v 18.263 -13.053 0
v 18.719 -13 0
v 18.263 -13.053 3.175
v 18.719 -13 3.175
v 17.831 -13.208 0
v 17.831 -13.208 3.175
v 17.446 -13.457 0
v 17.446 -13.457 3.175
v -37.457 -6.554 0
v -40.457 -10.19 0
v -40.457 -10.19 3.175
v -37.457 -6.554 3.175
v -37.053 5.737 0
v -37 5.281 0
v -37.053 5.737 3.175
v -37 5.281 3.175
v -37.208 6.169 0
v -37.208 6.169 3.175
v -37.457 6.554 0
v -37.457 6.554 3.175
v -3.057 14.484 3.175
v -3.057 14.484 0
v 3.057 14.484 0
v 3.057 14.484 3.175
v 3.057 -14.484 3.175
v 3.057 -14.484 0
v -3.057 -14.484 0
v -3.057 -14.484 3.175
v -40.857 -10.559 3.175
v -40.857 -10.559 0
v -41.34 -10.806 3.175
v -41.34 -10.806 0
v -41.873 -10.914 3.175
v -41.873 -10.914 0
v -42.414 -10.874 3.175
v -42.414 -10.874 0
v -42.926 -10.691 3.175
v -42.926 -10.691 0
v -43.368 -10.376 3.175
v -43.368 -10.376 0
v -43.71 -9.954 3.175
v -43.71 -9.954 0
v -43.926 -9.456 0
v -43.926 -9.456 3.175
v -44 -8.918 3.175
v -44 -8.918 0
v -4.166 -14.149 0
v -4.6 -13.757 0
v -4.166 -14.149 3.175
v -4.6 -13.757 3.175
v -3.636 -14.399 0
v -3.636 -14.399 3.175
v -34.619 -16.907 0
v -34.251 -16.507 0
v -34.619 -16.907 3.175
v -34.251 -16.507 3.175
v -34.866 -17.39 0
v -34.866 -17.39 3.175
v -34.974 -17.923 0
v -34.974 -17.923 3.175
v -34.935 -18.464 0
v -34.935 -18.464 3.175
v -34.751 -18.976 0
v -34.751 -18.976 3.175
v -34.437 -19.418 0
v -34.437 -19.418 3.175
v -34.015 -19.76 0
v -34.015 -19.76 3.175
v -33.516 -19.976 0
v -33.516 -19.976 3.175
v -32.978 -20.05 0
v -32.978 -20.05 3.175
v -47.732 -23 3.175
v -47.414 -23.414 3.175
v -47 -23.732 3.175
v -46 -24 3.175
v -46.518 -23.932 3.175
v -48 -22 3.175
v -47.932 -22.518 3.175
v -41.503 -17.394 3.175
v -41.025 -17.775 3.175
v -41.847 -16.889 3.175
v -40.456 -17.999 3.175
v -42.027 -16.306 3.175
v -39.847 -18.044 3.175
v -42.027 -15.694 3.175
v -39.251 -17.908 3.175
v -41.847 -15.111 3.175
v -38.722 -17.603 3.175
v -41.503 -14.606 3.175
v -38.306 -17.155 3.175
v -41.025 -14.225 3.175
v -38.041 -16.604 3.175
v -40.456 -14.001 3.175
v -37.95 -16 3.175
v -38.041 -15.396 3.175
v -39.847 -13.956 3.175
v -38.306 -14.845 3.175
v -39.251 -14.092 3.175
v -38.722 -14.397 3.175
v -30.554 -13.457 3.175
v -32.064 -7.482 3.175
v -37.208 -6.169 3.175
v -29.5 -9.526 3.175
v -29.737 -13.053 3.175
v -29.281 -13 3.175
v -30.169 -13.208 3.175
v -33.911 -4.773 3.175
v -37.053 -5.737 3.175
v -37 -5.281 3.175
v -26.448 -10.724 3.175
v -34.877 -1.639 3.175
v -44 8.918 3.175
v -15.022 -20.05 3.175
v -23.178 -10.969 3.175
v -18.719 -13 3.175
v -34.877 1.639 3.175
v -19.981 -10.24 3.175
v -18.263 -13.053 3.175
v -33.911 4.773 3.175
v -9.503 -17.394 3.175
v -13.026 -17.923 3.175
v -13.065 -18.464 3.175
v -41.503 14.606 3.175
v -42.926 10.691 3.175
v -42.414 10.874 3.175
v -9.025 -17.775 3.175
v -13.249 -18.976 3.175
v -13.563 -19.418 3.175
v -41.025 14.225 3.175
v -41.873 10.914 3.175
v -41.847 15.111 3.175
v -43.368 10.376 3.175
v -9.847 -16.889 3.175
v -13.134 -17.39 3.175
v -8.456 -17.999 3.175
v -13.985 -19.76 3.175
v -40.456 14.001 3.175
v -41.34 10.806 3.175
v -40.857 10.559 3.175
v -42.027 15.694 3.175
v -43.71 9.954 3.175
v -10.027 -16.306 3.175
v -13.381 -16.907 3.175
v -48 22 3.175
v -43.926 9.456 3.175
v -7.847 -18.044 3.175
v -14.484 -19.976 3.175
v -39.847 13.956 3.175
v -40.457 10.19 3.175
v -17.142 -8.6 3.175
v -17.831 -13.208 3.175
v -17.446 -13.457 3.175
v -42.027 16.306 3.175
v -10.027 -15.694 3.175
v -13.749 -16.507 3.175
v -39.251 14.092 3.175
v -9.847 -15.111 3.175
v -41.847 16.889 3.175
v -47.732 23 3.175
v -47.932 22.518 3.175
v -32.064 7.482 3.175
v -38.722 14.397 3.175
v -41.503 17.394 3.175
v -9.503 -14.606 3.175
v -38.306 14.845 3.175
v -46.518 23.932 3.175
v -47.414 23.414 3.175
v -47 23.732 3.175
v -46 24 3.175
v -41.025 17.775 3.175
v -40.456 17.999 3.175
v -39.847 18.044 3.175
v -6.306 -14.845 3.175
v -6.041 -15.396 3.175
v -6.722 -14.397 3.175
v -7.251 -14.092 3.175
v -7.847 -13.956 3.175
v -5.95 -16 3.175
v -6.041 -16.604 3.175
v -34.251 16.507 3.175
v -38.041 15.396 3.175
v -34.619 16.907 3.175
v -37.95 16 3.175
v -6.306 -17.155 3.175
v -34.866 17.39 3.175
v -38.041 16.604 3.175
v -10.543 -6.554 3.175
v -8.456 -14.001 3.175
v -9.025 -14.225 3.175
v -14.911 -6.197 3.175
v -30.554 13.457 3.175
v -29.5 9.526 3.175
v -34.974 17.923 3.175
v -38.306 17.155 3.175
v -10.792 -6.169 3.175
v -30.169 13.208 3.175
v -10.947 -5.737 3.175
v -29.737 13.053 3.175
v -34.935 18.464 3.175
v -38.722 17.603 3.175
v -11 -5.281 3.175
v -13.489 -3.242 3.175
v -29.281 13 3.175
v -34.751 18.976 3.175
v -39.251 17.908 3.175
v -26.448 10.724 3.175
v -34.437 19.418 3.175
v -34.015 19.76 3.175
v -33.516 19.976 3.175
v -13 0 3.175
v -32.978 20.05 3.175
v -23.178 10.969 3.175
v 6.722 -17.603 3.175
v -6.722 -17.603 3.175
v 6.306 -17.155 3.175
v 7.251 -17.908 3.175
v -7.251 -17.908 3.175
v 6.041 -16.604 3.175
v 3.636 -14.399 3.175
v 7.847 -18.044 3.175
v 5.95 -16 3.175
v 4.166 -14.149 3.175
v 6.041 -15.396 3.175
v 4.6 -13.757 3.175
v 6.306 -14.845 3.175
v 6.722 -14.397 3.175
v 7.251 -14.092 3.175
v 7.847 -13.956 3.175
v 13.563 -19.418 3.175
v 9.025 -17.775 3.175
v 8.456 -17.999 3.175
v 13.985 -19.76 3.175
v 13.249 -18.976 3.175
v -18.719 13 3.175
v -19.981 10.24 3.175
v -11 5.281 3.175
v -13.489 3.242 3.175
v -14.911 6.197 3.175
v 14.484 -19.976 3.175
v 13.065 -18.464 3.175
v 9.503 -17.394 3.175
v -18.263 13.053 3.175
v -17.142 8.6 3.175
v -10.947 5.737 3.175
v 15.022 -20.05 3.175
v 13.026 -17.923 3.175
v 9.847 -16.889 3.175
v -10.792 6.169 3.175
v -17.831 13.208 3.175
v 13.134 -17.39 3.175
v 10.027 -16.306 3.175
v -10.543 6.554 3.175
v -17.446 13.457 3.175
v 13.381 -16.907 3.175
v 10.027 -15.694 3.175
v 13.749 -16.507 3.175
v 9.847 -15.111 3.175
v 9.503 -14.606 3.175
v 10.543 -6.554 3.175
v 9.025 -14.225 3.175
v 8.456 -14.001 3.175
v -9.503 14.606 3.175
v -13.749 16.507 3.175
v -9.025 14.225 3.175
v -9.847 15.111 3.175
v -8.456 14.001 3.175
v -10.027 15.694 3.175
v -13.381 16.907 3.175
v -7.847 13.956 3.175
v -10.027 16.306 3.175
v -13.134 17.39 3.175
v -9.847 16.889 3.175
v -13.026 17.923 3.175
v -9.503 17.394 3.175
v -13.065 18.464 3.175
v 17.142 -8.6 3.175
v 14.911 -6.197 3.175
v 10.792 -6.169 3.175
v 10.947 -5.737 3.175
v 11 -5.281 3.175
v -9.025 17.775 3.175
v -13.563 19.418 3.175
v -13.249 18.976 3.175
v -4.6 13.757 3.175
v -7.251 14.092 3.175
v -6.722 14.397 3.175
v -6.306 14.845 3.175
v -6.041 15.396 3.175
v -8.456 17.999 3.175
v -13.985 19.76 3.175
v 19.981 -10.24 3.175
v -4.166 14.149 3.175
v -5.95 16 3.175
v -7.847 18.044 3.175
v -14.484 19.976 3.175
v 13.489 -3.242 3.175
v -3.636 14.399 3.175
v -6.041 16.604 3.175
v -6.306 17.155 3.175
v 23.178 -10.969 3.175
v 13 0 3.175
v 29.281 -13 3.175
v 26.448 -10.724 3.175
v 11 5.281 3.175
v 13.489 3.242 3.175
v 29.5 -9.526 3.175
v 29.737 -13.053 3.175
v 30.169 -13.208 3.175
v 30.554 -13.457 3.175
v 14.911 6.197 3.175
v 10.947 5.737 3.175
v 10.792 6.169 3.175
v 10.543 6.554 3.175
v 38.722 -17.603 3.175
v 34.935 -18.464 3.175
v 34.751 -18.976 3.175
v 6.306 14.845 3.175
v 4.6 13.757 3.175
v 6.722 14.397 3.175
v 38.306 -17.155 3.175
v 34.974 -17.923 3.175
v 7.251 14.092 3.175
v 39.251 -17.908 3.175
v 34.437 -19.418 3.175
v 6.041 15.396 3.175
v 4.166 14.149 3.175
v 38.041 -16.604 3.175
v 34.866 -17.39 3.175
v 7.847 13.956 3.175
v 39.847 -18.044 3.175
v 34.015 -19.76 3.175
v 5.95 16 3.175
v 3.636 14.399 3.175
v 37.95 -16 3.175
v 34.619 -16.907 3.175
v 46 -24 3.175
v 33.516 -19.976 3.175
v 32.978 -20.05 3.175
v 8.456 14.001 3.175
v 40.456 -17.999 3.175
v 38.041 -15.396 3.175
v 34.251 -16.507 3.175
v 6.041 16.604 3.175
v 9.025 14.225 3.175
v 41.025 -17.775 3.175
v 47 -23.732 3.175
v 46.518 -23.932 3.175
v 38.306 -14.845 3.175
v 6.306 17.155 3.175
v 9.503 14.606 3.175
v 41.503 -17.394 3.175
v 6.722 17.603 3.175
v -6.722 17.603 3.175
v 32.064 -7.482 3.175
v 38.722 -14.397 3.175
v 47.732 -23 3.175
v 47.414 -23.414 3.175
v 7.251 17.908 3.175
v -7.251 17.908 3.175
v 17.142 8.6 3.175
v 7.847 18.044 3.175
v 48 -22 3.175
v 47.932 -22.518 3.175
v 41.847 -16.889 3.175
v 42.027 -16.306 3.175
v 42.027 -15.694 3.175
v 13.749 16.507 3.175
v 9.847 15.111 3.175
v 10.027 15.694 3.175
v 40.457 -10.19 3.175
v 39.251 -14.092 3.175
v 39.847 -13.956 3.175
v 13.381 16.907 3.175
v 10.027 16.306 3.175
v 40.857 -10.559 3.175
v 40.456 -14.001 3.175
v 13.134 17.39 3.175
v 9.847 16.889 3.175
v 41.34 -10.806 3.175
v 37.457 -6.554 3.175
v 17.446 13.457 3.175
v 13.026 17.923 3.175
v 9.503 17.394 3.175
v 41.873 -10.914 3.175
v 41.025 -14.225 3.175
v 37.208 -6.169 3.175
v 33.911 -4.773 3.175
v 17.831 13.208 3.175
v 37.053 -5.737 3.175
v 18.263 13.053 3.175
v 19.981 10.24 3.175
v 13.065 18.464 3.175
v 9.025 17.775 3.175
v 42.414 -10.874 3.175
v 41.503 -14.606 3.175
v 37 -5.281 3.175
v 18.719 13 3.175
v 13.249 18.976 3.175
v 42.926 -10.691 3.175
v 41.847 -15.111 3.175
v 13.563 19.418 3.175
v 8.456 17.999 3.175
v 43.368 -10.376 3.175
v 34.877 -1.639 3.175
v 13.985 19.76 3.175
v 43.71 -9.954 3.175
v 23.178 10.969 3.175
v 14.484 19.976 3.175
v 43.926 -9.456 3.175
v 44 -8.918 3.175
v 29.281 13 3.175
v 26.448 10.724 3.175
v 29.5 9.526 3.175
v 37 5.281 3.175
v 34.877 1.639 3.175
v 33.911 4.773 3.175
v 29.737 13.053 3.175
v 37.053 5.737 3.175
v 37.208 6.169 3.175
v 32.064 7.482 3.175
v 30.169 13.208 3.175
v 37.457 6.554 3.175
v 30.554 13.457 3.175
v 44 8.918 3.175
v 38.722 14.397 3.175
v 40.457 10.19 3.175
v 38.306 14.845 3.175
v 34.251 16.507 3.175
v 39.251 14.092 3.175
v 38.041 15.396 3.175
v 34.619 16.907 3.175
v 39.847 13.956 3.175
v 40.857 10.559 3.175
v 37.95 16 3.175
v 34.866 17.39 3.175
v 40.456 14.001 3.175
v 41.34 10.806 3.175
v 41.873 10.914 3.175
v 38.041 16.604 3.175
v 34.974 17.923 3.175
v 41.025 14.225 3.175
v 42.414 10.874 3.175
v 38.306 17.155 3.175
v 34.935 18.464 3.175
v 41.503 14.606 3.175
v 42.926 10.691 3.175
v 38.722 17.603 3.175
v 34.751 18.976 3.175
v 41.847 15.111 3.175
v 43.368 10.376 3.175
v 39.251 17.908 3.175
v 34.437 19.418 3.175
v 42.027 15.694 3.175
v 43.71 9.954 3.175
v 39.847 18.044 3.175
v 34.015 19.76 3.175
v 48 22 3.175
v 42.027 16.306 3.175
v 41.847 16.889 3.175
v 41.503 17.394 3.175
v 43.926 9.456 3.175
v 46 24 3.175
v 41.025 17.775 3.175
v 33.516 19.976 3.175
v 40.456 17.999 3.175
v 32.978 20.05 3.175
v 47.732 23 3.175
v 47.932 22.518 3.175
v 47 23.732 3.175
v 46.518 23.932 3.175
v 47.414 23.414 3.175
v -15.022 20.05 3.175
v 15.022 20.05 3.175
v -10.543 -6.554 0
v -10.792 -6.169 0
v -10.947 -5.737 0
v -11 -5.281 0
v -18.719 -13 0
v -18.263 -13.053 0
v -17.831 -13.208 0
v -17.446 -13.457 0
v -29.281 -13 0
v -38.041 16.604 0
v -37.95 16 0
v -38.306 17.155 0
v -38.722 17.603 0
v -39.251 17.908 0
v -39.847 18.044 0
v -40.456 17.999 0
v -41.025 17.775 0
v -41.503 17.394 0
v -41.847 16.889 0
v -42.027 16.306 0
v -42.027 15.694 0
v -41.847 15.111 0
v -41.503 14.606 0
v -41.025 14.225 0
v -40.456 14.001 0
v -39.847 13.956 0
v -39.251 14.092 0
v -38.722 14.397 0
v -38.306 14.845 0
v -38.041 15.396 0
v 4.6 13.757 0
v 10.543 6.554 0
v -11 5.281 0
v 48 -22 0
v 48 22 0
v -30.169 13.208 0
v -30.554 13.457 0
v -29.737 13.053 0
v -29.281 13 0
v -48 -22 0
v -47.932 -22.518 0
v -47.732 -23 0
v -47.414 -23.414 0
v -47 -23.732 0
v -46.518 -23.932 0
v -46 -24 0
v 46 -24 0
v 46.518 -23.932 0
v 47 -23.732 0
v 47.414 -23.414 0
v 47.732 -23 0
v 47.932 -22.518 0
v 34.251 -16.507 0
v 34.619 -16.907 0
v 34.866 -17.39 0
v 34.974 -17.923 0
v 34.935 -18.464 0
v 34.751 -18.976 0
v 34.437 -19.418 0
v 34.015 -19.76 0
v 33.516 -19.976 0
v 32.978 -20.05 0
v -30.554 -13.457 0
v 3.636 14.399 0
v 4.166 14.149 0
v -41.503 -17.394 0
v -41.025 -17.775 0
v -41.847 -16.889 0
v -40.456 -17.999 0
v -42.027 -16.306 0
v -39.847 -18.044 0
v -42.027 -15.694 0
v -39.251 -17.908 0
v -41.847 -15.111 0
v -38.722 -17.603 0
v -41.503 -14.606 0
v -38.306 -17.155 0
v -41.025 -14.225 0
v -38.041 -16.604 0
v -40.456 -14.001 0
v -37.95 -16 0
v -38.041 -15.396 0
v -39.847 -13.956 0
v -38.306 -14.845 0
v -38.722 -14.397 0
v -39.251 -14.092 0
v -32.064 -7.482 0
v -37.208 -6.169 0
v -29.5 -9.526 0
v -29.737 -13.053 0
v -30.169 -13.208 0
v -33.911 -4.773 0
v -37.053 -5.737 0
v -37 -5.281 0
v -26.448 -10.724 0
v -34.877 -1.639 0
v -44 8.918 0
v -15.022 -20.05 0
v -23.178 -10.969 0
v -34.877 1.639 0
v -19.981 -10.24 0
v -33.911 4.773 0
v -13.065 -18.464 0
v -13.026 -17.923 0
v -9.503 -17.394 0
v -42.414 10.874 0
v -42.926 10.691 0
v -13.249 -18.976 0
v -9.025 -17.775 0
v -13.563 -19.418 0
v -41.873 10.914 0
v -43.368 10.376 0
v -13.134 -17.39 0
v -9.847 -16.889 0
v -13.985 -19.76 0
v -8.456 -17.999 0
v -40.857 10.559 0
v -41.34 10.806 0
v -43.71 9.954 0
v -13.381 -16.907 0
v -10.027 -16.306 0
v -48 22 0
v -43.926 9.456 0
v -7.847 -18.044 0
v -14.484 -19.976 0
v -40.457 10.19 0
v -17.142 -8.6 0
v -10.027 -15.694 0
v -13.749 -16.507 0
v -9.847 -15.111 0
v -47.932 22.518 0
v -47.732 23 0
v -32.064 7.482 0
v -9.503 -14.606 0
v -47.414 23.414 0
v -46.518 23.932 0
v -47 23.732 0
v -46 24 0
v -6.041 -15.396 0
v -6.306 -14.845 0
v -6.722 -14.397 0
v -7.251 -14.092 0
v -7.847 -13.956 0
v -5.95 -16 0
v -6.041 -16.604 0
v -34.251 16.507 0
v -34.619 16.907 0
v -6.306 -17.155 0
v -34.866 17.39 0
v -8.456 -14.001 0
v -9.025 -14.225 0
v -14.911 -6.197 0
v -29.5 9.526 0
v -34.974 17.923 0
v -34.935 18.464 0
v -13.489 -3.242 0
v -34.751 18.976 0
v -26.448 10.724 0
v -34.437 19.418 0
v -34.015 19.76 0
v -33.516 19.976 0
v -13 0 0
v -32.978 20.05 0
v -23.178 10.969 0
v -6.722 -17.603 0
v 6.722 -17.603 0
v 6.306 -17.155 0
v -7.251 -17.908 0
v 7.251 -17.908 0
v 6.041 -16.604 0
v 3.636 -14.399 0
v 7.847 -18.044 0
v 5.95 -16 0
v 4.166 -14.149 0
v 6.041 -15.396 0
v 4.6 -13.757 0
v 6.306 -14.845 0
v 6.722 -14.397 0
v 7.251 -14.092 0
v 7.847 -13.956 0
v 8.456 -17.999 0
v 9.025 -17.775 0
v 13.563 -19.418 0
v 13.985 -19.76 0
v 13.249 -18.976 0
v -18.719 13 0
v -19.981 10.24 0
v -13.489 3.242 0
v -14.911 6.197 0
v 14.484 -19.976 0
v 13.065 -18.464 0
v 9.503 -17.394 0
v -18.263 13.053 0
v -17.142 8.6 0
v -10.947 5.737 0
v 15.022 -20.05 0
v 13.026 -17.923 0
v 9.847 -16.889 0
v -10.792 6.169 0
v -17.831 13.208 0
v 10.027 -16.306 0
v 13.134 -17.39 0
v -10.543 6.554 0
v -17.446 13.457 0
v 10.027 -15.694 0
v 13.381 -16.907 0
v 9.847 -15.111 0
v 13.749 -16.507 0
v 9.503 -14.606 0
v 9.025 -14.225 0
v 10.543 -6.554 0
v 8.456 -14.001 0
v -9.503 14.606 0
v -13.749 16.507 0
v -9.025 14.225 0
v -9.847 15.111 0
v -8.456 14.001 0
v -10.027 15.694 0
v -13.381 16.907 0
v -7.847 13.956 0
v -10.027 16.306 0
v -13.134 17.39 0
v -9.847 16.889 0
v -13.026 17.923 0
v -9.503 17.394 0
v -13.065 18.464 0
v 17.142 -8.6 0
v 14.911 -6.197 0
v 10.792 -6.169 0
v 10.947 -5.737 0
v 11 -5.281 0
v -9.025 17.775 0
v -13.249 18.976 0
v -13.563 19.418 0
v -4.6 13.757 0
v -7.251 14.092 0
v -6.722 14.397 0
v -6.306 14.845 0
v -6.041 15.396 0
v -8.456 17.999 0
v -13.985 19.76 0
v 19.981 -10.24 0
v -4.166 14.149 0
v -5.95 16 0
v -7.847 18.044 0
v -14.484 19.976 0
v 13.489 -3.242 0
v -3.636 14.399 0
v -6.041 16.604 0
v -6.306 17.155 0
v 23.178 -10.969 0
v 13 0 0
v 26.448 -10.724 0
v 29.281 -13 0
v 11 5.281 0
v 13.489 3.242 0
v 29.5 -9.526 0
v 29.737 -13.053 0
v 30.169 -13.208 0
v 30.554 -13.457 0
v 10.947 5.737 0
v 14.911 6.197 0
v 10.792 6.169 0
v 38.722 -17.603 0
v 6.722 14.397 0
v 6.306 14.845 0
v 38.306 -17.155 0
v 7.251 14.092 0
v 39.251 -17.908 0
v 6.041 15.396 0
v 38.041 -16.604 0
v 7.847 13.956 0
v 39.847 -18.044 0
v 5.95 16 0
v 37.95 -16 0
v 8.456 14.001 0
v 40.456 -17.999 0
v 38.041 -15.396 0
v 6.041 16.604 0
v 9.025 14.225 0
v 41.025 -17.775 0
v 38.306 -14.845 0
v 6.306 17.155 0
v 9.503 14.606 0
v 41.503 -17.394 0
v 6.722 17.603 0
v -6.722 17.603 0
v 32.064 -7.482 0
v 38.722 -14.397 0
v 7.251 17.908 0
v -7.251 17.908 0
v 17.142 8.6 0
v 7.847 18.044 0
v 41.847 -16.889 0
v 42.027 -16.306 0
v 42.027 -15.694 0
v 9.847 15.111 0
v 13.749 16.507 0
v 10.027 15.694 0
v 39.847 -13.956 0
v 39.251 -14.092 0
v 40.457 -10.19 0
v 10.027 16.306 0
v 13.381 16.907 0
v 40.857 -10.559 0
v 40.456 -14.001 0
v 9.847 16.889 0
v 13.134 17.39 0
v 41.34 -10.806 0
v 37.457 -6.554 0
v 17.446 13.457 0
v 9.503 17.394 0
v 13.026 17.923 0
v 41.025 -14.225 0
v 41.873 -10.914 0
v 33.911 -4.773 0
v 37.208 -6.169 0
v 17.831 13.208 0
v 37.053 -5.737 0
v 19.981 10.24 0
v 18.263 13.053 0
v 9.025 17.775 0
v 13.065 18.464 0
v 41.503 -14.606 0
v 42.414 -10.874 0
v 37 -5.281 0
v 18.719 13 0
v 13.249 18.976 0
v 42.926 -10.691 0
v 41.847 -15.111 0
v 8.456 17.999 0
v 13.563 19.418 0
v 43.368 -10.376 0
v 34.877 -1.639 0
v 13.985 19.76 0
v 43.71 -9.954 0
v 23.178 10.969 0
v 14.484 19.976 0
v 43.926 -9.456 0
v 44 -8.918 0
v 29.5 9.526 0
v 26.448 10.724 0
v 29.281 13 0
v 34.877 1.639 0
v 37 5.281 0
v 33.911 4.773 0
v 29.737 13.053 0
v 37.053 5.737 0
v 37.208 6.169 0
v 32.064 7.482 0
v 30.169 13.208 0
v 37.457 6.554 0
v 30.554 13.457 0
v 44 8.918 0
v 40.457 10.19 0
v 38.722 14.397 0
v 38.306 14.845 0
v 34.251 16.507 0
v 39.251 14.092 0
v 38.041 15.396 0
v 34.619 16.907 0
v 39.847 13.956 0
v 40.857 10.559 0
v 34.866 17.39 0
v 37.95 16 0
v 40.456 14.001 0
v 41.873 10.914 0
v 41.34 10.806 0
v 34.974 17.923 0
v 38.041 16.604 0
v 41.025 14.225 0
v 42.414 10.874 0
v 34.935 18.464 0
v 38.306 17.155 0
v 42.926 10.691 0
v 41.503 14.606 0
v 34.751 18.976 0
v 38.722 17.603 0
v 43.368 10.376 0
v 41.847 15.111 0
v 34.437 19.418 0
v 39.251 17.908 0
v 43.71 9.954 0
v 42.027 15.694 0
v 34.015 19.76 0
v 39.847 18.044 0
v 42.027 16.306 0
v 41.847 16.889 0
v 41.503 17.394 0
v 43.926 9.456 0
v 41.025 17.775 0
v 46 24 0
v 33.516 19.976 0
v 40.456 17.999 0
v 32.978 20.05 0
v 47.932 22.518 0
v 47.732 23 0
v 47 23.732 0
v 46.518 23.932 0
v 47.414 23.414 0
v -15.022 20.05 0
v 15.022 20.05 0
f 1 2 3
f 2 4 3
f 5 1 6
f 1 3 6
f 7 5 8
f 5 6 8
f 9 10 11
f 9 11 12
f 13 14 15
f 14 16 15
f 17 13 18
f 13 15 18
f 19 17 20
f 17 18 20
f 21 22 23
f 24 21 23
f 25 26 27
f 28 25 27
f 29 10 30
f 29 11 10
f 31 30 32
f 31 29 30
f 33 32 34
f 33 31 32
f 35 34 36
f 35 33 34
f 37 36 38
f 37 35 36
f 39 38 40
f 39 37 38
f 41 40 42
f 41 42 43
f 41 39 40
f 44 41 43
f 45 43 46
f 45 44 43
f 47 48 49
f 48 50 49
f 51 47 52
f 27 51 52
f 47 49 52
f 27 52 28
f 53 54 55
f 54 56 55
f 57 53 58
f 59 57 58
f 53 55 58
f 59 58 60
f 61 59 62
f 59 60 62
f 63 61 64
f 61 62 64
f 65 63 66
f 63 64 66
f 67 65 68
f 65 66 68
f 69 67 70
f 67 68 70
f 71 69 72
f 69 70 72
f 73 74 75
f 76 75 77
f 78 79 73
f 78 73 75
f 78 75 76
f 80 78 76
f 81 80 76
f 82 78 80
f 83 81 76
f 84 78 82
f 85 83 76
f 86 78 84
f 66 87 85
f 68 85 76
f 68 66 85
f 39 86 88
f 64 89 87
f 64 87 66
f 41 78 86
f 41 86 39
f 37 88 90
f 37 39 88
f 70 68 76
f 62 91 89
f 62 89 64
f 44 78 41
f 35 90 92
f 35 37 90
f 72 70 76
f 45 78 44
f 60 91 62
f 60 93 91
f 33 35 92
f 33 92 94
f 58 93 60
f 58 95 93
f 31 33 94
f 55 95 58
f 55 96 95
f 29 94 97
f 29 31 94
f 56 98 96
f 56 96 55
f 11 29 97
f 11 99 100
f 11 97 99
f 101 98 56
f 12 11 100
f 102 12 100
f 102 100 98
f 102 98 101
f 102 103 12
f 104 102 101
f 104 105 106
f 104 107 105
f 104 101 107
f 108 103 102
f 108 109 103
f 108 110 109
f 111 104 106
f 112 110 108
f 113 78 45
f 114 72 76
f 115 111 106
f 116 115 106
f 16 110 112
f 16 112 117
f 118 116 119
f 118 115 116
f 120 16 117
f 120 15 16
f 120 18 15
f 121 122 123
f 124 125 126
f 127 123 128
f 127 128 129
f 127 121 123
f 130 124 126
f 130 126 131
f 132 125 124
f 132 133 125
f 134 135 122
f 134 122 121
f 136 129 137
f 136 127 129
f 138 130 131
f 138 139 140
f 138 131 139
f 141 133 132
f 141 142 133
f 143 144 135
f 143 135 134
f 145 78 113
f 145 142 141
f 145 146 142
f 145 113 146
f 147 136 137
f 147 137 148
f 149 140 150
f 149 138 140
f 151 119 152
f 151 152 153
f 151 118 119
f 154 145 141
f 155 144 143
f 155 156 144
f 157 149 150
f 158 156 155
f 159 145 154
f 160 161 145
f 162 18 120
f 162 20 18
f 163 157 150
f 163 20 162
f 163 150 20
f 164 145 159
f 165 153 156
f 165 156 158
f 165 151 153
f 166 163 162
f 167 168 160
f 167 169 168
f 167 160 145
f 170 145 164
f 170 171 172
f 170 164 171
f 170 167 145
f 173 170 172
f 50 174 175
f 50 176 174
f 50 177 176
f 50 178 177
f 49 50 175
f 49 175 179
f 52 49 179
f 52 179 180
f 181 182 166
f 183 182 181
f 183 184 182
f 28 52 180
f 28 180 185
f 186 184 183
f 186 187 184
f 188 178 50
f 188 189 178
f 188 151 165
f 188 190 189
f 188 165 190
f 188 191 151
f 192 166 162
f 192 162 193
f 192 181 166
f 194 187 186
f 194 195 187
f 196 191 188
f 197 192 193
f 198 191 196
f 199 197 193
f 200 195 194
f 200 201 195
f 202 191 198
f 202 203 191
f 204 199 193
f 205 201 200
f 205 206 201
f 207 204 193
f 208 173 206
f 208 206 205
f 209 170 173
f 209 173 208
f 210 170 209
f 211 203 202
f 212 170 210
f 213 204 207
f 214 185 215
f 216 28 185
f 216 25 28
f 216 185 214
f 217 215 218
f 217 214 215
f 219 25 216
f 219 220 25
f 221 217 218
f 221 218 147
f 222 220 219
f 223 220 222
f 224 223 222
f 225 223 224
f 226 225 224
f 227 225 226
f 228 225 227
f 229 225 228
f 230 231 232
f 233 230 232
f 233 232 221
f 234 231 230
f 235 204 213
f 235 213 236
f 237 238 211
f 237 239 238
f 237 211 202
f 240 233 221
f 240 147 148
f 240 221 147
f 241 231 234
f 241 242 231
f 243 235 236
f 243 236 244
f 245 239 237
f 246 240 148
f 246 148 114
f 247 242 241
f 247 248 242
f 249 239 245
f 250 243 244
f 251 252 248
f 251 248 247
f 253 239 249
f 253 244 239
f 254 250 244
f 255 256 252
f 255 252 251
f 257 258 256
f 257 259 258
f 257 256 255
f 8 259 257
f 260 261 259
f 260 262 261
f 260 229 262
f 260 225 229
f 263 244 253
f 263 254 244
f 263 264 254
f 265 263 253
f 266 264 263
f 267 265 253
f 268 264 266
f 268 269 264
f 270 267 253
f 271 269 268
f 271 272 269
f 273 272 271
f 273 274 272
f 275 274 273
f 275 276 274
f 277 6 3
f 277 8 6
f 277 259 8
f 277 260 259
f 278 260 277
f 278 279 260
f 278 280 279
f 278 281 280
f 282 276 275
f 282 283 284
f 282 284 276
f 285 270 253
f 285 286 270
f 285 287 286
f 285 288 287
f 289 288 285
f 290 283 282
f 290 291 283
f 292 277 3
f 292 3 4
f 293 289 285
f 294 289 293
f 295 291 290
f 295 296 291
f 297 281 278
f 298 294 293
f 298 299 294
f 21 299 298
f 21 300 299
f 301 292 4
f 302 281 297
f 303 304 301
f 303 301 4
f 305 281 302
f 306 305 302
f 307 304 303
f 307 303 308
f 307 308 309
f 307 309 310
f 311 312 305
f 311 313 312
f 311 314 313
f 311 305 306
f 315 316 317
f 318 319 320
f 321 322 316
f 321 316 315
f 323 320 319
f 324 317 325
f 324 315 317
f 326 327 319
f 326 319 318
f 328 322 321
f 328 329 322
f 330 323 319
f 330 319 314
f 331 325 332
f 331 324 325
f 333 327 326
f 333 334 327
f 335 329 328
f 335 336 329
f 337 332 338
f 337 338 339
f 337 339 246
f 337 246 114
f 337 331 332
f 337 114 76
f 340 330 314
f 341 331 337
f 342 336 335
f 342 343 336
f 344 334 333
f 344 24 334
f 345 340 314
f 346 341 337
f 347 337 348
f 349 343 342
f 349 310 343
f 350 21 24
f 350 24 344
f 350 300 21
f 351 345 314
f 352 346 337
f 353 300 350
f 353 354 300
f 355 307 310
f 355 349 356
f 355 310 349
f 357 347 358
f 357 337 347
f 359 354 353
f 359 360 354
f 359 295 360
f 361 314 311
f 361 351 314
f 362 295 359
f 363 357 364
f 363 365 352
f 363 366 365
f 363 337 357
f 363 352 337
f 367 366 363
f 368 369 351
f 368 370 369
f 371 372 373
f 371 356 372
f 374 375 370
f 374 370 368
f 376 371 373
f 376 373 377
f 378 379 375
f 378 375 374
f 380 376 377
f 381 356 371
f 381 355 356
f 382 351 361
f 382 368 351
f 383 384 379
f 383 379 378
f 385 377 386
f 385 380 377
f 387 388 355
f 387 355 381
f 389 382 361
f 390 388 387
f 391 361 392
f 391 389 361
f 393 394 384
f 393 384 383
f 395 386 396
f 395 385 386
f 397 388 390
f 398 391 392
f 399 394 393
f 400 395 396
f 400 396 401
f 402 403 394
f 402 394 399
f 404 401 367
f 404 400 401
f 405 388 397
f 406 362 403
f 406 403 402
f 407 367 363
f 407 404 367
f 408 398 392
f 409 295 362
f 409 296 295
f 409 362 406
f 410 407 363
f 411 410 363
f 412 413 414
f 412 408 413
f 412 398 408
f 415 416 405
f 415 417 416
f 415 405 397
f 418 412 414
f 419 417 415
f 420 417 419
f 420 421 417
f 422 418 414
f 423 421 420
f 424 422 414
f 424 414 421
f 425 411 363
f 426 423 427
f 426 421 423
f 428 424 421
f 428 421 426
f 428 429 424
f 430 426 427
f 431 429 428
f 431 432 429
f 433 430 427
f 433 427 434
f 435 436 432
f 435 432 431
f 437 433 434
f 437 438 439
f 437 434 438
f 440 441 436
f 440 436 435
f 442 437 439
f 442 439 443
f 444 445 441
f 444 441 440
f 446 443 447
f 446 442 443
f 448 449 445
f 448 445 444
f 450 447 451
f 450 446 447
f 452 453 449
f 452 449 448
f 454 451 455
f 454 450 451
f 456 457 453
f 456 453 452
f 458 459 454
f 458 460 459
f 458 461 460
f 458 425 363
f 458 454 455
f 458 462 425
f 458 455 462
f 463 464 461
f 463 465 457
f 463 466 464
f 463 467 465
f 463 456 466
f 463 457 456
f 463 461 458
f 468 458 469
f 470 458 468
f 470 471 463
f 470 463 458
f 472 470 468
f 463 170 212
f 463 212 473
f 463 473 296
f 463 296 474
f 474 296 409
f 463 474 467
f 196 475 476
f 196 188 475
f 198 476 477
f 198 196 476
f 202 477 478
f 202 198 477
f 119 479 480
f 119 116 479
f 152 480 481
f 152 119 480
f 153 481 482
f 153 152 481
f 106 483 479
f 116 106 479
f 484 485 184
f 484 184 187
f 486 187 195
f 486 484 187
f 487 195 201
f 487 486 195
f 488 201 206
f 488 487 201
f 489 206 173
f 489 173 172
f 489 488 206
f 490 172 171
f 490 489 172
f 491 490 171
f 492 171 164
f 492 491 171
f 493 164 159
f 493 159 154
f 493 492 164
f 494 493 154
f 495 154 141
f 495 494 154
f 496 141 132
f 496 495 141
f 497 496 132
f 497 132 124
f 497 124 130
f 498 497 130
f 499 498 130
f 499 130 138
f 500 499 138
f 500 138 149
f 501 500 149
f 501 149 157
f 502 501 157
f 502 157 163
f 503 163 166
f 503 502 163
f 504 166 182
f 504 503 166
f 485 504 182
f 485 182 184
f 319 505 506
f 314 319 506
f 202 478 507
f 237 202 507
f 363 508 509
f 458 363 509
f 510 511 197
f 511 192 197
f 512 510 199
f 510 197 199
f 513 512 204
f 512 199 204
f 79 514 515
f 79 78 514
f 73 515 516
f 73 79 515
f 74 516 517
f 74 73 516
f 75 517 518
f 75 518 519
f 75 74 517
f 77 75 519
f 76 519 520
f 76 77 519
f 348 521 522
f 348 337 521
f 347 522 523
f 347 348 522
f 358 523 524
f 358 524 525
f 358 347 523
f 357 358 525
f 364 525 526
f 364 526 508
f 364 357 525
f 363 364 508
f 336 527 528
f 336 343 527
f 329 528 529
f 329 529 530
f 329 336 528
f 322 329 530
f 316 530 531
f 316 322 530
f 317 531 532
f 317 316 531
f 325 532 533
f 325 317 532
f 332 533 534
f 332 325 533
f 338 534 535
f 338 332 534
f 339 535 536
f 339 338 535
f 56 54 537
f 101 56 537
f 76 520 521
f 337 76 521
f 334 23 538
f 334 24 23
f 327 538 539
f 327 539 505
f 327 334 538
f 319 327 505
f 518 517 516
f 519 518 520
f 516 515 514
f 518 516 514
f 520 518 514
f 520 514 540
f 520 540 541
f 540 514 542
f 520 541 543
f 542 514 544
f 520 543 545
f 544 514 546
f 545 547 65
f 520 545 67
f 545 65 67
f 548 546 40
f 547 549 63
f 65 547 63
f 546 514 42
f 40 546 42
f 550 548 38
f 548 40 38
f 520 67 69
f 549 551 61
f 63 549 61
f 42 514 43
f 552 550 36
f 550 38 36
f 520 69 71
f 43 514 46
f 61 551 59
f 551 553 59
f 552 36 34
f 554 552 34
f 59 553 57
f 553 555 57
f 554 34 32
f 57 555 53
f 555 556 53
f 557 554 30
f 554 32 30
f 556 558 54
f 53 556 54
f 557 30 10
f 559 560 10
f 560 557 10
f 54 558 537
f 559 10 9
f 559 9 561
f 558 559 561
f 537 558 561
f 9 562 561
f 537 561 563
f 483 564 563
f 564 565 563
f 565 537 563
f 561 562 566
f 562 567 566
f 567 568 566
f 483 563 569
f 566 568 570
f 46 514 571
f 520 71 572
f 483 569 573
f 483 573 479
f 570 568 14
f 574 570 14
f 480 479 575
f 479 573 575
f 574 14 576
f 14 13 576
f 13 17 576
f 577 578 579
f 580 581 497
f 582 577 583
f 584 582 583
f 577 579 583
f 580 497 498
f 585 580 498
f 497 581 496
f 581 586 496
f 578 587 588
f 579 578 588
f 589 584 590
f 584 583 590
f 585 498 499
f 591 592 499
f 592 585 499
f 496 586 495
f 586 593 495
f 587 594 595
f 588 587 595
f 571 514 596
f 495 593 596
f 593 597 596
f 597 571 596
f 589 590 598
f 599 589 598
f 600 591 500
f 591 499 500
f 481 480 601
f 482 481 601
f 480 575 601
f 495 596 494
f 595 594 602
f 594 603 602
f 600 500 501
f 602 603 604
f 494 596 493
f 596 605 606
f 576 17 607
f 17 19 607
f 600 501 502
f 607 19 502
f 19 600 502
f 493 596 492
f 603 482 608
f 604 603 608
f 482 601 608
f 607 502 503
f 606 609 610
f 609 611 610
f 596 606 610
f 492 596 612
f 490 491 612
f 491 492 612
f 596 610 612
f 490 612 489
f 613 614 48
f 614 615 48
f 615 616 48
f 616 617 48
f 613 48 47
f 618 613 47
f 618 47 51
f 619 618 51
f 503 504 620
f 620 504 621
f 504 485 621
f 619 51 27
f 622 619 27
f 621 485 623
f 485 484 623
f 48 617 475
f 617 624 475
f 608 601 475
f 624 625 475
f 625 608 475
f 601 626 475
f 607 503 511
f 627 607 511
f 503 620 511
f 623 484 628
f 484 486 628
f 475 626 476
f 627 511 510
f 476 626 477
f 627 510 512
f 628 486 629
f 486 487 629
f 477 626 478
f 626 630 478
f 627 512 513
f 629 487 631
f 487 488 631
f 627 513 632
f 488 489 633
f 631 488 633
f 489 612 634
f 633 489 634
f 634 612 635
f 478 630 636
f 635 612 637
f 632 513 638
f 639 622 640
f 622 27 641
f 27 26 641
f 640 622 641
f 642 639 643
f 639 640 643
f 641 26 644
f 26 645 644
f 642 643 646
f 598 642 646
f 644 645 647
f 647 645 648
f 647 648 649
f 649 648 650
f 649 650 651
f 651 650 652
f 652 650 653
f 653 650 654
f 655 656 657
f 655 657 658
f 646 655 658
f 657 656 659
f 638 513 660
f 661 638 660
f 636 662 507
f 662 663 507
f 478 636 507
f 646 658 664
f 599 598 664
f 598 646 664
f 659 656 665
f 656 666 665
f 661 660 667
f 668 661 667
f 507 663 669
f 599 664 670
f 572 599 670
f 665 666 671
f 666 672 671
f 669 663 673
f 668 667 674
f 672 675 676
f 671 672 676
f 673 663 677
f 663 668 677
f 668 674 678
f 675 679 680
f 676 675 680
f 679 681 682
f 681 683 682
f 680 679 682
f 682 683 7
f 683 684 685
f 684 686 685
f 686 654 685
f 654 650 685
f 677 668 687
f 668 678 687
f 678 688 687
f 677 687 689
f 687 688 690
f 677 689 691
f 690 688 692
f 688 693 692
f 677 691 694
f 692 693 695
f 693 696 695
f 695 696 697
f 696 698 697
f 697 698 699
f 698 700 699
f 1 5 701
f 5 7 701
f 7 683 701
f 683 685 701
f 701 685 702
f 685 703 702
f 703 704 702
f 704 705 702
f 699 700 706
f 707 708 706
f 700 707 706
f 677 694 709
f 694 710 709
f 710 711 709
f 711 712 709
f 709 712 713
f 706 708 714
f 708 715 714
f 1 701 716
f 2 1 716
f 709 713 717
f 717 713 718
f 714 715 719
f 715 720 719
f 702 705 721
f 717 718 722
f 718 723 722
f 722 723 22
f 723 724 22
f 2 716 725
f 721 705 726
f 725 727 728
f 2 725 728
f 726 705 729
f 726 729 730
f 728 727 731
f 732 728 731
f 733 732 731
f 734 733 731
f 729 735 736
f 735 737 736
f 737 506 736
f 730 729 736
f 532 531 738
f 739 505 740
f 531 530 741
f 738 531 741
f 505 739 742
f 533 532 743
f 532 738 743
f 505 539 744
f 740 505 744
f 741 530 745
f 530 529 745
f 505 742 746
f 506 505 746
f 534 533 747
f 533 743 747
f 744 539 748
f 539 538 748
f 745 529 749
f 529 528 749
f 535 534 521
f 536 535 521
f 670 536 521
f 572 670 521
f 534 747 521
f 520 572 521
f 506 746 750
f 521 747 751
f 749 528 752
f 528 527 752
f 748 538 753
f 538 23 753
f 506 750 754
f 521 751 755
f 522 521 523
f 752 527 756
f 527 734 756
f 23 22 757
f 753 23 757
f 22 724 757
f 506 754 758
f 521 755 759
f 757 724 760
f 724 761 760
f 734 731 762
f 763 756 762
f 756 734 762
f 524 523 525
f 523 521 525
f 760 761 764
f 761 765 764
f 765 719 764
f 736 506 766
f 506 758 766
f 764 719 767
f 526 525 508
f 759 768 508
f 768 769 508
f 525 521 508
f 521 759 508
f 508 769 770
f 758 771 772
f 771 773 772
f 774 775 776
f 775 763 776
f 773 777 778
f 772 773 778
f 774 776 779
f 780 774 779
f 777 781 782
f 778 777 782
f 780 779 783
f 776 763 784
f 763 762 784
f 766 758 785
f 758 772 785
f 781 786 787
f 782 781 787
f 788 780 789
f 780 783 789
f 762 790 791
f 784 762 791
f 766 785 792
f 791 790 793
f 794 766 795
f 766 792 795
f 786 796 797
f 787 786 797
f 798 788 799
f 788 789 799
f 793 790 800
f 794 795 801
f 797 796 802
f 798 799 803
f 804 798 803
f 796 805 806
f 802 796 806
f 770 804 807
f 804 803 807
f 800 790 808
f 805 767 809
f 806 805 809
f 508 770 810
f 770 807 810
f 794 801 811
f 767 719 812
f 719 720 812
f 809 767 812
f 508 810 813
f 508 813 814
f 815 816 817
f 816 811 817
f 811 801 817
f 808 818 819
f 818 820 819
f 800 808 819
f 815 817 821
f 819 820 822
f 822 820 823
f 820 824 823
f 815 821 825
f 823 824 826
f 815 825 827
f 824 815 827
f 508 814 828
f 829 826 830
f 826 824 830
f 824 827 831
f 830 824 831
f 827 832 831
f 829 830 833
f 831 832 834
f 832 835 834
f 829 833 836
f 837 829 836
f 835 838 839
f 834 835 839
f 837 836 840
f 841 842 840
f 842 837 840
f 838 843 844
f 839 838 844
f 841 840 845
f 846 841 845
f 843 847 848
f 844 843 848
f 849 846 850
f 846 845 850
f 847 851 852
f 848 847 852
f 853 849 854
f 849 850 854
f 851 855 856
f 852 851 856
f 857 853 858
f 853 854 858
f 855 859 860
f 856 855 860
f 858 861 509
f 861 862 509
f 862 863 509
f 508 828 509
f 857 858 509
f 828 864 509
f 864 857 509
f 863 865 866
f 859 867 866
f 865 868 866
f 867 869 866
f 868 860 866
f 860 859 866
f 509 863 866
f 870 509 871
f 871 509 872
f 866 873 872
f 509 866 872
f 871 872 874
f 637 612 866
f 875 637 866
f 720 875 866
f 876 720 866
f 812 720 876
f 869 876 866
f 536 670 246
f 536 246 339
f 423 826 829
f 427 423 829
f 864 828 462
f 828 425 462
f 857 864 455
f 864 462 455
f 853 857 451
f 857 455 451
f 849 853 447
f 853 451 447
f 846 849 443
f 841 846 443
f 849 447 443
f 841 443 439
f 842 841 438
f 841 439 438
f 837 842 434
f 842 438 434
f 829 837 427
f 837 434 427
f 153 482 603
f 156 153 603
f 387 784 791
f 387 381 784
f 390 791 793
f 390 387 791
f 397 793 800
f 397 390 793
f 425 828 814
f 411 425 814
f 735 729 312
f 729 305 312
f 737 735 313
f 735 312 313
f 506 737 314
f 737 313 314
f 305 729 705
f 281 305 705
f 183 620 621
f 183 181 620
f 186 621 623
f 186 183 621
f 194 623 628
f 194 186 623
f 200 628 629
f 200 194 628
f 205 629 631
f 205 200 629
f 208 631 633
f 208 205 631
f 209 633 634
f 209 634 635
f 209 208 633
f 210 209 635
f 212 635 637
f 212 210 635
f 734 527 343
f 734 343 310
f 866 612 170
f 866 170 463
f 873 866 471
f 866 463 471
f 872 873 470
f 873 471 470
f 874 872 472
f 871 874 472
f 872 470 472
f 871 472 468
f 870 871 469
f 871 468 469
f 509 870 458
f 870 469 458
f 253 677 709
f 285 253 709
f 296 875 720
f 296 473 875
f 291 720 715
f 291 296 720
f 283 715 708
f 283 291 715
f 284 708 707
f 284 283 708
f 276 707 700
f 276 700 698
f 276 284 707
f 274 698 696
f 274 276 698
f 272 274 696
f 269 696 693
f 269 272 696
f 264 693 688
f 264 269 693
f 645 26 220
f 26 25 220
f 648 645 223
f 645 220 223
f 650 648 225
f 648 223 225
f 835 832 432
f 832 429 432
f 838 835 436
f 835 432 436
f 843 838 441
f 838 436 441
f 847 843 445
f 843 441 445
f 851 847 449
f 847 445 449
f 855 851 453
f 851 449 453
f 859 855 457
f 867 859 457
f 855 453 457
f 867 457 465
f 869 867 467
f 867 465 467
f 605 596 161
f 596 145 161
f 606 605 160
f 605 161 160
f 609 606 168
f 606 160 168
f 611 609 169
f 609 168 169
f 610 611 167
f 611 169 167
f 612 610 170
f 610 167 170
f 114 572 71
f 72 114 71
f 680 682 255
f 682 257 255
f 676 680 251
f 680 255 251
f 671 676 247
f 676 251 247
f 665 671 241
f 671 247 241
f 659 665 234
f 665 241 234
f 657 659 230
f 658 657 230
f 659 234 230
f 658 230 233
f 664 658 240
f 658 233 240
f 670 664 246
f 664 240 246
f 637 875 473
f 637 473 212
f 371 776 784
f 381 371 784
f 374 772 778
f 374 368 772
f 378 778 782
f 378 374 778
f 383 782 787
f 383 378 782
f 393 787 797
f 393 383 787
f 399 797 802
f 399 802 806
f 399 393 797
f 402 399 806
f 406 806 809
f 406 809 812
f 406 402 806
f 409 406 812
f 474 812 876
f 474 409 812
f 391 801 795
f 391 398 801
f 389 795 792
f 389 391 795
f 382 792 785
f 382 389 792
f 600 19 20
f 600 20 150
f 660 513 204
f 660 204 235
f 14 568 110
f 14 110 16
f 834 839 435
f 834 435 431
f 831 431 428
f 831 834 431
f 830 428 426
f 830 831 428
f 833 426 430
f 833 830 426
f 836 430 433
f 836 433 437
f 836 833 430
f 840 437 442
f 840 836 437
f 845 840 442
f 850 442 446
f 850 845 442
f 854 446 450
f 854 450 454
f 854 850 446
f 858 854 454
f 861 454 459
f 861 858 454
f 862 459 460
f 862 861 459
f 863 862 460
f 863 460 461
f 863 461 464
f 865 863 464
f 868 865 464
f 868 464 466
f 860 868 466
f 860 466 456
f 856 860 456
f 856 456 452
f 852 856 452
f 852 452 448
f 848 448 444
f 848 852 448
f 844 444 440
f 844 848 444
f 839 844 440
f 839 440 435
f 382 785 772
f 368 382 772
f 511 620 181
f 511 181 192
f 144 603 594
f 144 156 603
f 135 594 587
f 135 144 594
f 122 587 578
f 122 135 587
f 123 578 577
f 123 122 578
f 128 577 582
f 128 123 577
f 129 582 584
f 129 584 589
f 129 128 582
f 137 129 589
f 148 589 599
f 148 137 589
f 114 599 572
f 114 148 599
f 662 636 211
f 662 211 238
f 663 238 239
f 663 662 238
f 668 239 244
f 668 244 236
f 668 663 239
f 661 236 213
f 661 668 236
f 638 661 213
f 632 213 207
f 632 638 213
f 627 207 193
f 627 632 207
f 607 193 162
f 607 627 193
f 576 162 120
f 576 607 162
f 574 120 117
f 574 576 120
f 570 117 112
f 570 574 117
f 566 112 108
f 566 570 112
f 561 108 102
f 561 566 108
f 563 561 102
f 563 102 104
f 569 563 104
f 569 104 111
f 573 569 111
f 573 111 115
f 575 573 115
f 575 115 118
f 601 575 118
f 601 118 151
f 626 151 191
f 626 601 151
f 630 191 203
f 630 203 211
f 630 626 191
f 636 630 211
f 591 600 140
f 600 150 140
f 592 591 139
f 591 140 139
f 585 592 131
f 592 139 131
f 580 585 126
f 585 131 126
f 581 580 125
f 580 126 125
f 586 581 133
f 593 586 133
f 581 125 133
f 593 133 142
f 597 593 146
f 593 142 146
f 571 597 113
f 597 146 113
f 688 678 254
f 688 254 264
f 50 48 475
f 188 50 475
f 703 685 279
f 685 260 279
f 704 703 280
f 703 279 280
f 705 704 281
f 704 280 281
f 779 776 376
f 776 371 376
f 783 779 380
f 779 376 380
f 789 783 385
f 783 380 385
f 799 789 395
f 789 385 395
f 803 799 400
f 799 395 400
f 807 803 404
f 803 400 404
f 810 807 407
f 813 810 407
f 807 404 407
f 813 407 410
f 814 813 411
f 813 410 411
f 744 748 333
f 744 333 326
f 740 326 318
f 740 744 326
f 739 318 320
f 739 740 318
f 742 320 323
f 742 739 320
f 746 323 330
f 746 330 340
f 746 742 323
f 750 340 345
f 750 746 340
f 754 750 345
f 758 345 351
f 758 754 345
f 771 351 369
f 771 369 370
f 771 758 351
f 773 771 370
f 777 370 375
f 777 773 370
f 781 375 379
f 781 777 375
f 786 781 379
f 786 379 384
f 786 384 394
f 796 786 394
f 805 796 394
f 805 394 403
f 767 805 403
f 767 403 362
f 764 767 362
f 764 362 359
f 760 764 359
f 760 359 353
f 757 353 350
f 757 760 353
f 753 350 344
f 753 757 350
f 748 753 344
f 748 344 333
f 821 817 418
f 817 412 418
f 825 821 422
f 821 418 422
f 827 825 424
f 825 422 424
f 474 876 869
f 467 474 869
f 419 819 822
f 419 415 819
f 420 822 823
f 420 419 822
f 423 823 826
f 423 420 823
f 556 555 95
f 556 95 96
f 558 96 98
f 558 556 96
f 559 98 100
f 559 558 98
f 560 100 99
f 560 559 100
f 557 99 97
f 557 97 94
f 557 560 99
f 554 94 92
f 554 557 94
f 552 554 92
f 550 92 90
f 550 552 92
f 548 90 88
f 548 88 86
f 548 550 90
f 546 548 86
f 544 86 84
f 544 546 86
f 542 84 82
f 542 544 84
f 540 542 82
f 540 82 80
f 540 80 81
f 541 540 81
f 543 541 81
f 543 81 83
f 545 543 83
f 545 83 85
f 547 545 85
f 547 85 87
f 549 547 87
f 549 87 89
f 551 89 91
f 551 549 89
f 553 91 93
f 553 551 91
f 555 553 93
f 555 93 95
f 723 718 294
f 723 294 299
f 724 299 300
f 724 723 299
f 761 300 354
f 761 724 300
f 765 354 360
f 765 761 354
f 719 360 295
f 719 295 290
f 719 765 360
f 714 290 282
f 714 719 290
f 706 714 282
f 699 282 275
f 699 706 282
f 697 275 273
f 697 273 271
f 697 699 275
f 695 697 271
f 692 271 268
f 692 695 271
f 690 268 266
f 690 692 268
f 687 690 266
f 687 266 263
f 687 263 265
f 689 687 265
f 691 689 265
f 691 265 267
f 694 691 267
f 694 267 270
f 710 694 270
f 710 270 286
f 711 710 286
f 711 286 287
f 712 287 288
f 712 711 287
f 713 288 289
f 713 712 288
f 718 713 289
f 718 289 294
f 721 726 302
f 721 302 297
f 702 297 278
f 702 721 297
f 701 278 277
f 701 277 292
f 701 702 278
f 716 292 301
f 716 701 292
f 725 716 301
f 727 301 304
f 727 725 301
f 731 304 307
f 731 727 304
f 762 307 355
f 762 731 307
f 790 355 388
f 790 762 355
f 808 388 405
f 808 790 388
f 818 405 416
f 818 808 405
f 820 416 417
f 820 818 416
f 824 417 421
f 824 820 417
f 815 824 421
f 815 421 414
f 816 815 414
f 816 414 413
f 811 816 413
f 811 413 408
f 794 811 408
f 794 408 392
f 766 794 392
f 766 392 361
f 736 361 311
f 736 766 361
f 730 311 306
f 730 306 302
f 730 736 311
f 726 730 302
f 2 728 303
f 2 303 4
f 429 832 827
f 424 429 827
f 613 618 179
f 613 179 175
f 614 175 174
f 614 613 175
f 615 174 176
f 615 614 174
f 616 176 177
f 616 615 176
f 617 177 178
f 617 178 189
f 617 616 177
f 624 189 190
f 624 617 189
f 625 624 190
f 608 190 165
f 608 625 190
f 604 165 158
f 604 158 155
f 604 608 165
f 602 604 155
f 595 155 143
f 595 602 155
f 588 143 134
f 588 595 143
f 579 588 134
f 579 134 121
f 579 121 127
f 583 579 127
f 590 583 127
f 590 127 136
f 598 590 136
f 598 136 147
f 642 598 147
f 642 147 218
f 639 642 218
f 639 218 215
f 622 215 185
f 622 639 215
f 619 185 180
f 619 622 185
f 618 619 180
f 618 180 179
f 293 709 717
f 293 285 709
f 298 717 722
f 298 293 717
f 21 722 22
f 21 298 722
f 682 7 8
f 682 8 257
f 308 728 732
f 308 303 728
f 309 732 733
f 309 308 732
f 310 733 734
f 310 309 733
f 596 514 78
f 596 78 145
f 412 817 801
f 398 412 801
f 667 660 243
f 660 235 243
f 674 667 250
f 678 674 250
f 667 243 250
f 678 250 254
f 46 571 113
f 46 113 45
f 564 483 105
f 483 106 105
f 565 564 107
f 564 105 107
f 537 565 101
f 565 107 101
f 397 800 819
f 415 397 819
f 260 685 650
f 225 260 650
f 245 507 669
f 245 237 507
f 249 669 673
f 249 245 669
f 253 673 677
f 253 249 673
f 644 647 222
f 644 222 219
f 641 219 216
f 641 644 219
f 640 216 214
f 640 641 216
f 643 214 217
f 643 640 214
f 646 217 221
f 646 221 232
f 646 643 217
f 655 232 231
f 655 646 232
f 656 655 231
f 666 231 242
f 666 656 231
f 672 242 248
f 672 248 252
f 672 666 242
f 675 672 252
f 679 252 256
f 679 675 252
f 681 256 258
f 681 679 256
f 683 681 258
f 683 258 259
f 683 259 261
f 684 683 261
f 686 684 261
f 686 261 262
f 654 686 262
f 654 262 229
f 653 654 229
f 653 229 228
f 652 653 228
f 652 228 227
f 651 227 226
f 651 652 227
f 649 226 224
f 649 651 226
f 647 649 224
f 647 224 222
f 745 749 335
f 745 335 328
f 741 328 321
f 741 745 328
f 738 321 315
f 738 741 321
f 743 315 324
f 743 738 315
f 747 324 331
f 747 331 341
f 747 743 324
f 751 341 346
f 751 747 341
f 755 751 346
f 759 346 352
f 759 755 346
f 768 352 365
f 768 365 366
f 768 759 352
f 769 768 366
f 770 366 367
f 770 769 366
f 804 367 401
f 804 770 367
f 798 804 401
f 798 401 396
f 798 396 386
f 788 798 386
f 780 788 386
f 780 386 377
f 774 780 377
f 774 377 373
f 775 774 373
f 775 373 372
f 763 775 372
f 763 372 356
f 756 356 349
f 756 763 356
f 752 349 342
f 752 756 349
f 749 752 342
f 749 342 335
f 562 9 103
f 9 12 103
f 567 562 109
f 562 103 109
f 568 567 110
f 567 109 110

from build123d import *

# Parameters (mm, degrees)
SKETCH1_W           = 96
SKETCH1_H           = 48
SKETCH1_R           = 2.05
SKETCH1_R_2         = 11
BOSS_EXTRUDE1_DEPTH = 3.175
FILLET1_R           = 2


with BuildPart() as part:
    # Sketch1 → Boss-Extrude1 (new body)
    with BuildSketch(Plane.XY):
        Rectangle(SKETCH1_W, SKETCH1_H)
        with Locations((-40, 16)):
            Circle(SKETCH1_R, mode=Mode.SUBTRACT)
        with Locations((-8, 16)):
            Circle(SKETCH1_R, mode=Mode.SUBTRACT)
        with Locations((-8, -16)):
            Circle(SKETCH1_R, mode=Mode.SUBTRACT)
        with Locations((-40, -16)):
            Circle(SKETCH1_R, mode=Mode.SUBTRACT)
        with Locations((-24, 0)):
            Circle(SKETCH1_R_2, mode=Mode.SUBTRACT)
        with Locations(Location((8, 16, 0), (0, 0, 180))):
            Circle(SKETCH1_R, mode=Mode.SUBTRACT)
        with Locations(Location((8, -16, 0), (0, 0, 180))):
            Circle(SKETCH1_R, mode=Mode.SUBTRACT)
        with Locations(Location((40, -16, 0), (0, 0, 180))):
            Circle(SKETCH1_R, mode=Mode.SUBTRACT)
        with Locations(Location((24, 0, 0), (0, 0, 180))):
            Circle(SKETCH1_R_2, mode=Mode.SUBTRACT)
        with Locations(Location((40, 16, 0), (0, 0, 180))):
            Circle(SKETCH1_R, mode=Mode.SUBTRACT)
        Polygon((-38.544929421, 20.05), (-30, 13), (-18, 13), (-9.455070579, 20.05), align=None, mode=Mode.SUBTRACT)
        Polygon((-18, -13), (-9.455070579, -20.05), (-38.544929421, -20.05), (-30, -13), align=None, mode=Mode.SUBTRACT)
        Polygon((-11, -6), (-11, 6), (-4, 14.484327085), (4, 14.484327085), (11, 6), (11, -6), (4, -14.484327085), (-4, -14.484327085), align=None, mode=Mode.SUBTRACT)
        Polygon((30, -13), (18, -13), (9.455070579, -20.05), (38.544929421, -20.05), align=None, mode=Mode.SUBTRACT)
        Polygon((37, -6), (37, 6), (44, 14.484327085), (44, -14.484327085), align=None, mode=Mode.SUBTRACT)
        Polygon((18, 13), (9.455070579, 20.05), (38.544929421, 20.05), (30, 13), align=None, mode=Mode.SUBTRACT)
        Polygon((-44, -14.484327085), (-37, -6), (-37, 6), (-44, 14.484327085), align=None, mode=Mode.SUBTRACT)
    extrude(amount=BOSS_EXTRUDE1_DEPTH)

    # Fillet1
    fillet1_edges = [part.edges().sort_by_distance(p)[0] for p in [
        (38.544929421, -20.05, 1.5875),
        (30, -13, 1.5875),
        (18, -13, 1.5875),
        (9.455070579, -20.05, 1.5875),
        (37, -6, 1.5875),
        (44, -14.484327085, 1.5875),
        (44, 14.484327085, 1.5875),
        (37, 6, 1.5875),
        (18, 13, 1.5875),
        (30, 13, 1.5875),
        (38.544929421, 20.05, 1.5875),
        (9.455070579, 20.05, 1.5875),
        (-9.455070579, 20.05, 1.5875),
        (-38.544929421, 20.05, 1.5875),
        (-30, 13, 1.5875),
        (-18, 13, 1.5875),
        (-11, -6, 1.5875),
        (-4, -14.484327085, 1.5875),
        (4, -14.484327085, 1.5875),
        (11, -6, 1.5875),
        (11, 6, 1.5875),
        (4, 14.484327085, 1.5875),
        (-4, 14.484327085, 1.5875),
        (-11, 6, 1.5875),
        (-37, -6, 1.5875),
        (-37, 6, 1.5875),
        (-44, 14.484327085, 1.5875),
        (-44, -14.484327085, 1.5875),
        (-48, 24, 1.5875),
        (48, 24, 1.5875),
        (48, -24, 1.5875),
        (-48, -24, 1.5875),
        (-18, -13, 1.5875),
        (-30, -13, 1.5875),
        (-38.544929421, -20.05, 1.5875),
        (-9.455070579, -20.05, 1.5875),
    ]]
    fillet(fillet1_edges, radius=FILLET1_R)


solid = part.part
